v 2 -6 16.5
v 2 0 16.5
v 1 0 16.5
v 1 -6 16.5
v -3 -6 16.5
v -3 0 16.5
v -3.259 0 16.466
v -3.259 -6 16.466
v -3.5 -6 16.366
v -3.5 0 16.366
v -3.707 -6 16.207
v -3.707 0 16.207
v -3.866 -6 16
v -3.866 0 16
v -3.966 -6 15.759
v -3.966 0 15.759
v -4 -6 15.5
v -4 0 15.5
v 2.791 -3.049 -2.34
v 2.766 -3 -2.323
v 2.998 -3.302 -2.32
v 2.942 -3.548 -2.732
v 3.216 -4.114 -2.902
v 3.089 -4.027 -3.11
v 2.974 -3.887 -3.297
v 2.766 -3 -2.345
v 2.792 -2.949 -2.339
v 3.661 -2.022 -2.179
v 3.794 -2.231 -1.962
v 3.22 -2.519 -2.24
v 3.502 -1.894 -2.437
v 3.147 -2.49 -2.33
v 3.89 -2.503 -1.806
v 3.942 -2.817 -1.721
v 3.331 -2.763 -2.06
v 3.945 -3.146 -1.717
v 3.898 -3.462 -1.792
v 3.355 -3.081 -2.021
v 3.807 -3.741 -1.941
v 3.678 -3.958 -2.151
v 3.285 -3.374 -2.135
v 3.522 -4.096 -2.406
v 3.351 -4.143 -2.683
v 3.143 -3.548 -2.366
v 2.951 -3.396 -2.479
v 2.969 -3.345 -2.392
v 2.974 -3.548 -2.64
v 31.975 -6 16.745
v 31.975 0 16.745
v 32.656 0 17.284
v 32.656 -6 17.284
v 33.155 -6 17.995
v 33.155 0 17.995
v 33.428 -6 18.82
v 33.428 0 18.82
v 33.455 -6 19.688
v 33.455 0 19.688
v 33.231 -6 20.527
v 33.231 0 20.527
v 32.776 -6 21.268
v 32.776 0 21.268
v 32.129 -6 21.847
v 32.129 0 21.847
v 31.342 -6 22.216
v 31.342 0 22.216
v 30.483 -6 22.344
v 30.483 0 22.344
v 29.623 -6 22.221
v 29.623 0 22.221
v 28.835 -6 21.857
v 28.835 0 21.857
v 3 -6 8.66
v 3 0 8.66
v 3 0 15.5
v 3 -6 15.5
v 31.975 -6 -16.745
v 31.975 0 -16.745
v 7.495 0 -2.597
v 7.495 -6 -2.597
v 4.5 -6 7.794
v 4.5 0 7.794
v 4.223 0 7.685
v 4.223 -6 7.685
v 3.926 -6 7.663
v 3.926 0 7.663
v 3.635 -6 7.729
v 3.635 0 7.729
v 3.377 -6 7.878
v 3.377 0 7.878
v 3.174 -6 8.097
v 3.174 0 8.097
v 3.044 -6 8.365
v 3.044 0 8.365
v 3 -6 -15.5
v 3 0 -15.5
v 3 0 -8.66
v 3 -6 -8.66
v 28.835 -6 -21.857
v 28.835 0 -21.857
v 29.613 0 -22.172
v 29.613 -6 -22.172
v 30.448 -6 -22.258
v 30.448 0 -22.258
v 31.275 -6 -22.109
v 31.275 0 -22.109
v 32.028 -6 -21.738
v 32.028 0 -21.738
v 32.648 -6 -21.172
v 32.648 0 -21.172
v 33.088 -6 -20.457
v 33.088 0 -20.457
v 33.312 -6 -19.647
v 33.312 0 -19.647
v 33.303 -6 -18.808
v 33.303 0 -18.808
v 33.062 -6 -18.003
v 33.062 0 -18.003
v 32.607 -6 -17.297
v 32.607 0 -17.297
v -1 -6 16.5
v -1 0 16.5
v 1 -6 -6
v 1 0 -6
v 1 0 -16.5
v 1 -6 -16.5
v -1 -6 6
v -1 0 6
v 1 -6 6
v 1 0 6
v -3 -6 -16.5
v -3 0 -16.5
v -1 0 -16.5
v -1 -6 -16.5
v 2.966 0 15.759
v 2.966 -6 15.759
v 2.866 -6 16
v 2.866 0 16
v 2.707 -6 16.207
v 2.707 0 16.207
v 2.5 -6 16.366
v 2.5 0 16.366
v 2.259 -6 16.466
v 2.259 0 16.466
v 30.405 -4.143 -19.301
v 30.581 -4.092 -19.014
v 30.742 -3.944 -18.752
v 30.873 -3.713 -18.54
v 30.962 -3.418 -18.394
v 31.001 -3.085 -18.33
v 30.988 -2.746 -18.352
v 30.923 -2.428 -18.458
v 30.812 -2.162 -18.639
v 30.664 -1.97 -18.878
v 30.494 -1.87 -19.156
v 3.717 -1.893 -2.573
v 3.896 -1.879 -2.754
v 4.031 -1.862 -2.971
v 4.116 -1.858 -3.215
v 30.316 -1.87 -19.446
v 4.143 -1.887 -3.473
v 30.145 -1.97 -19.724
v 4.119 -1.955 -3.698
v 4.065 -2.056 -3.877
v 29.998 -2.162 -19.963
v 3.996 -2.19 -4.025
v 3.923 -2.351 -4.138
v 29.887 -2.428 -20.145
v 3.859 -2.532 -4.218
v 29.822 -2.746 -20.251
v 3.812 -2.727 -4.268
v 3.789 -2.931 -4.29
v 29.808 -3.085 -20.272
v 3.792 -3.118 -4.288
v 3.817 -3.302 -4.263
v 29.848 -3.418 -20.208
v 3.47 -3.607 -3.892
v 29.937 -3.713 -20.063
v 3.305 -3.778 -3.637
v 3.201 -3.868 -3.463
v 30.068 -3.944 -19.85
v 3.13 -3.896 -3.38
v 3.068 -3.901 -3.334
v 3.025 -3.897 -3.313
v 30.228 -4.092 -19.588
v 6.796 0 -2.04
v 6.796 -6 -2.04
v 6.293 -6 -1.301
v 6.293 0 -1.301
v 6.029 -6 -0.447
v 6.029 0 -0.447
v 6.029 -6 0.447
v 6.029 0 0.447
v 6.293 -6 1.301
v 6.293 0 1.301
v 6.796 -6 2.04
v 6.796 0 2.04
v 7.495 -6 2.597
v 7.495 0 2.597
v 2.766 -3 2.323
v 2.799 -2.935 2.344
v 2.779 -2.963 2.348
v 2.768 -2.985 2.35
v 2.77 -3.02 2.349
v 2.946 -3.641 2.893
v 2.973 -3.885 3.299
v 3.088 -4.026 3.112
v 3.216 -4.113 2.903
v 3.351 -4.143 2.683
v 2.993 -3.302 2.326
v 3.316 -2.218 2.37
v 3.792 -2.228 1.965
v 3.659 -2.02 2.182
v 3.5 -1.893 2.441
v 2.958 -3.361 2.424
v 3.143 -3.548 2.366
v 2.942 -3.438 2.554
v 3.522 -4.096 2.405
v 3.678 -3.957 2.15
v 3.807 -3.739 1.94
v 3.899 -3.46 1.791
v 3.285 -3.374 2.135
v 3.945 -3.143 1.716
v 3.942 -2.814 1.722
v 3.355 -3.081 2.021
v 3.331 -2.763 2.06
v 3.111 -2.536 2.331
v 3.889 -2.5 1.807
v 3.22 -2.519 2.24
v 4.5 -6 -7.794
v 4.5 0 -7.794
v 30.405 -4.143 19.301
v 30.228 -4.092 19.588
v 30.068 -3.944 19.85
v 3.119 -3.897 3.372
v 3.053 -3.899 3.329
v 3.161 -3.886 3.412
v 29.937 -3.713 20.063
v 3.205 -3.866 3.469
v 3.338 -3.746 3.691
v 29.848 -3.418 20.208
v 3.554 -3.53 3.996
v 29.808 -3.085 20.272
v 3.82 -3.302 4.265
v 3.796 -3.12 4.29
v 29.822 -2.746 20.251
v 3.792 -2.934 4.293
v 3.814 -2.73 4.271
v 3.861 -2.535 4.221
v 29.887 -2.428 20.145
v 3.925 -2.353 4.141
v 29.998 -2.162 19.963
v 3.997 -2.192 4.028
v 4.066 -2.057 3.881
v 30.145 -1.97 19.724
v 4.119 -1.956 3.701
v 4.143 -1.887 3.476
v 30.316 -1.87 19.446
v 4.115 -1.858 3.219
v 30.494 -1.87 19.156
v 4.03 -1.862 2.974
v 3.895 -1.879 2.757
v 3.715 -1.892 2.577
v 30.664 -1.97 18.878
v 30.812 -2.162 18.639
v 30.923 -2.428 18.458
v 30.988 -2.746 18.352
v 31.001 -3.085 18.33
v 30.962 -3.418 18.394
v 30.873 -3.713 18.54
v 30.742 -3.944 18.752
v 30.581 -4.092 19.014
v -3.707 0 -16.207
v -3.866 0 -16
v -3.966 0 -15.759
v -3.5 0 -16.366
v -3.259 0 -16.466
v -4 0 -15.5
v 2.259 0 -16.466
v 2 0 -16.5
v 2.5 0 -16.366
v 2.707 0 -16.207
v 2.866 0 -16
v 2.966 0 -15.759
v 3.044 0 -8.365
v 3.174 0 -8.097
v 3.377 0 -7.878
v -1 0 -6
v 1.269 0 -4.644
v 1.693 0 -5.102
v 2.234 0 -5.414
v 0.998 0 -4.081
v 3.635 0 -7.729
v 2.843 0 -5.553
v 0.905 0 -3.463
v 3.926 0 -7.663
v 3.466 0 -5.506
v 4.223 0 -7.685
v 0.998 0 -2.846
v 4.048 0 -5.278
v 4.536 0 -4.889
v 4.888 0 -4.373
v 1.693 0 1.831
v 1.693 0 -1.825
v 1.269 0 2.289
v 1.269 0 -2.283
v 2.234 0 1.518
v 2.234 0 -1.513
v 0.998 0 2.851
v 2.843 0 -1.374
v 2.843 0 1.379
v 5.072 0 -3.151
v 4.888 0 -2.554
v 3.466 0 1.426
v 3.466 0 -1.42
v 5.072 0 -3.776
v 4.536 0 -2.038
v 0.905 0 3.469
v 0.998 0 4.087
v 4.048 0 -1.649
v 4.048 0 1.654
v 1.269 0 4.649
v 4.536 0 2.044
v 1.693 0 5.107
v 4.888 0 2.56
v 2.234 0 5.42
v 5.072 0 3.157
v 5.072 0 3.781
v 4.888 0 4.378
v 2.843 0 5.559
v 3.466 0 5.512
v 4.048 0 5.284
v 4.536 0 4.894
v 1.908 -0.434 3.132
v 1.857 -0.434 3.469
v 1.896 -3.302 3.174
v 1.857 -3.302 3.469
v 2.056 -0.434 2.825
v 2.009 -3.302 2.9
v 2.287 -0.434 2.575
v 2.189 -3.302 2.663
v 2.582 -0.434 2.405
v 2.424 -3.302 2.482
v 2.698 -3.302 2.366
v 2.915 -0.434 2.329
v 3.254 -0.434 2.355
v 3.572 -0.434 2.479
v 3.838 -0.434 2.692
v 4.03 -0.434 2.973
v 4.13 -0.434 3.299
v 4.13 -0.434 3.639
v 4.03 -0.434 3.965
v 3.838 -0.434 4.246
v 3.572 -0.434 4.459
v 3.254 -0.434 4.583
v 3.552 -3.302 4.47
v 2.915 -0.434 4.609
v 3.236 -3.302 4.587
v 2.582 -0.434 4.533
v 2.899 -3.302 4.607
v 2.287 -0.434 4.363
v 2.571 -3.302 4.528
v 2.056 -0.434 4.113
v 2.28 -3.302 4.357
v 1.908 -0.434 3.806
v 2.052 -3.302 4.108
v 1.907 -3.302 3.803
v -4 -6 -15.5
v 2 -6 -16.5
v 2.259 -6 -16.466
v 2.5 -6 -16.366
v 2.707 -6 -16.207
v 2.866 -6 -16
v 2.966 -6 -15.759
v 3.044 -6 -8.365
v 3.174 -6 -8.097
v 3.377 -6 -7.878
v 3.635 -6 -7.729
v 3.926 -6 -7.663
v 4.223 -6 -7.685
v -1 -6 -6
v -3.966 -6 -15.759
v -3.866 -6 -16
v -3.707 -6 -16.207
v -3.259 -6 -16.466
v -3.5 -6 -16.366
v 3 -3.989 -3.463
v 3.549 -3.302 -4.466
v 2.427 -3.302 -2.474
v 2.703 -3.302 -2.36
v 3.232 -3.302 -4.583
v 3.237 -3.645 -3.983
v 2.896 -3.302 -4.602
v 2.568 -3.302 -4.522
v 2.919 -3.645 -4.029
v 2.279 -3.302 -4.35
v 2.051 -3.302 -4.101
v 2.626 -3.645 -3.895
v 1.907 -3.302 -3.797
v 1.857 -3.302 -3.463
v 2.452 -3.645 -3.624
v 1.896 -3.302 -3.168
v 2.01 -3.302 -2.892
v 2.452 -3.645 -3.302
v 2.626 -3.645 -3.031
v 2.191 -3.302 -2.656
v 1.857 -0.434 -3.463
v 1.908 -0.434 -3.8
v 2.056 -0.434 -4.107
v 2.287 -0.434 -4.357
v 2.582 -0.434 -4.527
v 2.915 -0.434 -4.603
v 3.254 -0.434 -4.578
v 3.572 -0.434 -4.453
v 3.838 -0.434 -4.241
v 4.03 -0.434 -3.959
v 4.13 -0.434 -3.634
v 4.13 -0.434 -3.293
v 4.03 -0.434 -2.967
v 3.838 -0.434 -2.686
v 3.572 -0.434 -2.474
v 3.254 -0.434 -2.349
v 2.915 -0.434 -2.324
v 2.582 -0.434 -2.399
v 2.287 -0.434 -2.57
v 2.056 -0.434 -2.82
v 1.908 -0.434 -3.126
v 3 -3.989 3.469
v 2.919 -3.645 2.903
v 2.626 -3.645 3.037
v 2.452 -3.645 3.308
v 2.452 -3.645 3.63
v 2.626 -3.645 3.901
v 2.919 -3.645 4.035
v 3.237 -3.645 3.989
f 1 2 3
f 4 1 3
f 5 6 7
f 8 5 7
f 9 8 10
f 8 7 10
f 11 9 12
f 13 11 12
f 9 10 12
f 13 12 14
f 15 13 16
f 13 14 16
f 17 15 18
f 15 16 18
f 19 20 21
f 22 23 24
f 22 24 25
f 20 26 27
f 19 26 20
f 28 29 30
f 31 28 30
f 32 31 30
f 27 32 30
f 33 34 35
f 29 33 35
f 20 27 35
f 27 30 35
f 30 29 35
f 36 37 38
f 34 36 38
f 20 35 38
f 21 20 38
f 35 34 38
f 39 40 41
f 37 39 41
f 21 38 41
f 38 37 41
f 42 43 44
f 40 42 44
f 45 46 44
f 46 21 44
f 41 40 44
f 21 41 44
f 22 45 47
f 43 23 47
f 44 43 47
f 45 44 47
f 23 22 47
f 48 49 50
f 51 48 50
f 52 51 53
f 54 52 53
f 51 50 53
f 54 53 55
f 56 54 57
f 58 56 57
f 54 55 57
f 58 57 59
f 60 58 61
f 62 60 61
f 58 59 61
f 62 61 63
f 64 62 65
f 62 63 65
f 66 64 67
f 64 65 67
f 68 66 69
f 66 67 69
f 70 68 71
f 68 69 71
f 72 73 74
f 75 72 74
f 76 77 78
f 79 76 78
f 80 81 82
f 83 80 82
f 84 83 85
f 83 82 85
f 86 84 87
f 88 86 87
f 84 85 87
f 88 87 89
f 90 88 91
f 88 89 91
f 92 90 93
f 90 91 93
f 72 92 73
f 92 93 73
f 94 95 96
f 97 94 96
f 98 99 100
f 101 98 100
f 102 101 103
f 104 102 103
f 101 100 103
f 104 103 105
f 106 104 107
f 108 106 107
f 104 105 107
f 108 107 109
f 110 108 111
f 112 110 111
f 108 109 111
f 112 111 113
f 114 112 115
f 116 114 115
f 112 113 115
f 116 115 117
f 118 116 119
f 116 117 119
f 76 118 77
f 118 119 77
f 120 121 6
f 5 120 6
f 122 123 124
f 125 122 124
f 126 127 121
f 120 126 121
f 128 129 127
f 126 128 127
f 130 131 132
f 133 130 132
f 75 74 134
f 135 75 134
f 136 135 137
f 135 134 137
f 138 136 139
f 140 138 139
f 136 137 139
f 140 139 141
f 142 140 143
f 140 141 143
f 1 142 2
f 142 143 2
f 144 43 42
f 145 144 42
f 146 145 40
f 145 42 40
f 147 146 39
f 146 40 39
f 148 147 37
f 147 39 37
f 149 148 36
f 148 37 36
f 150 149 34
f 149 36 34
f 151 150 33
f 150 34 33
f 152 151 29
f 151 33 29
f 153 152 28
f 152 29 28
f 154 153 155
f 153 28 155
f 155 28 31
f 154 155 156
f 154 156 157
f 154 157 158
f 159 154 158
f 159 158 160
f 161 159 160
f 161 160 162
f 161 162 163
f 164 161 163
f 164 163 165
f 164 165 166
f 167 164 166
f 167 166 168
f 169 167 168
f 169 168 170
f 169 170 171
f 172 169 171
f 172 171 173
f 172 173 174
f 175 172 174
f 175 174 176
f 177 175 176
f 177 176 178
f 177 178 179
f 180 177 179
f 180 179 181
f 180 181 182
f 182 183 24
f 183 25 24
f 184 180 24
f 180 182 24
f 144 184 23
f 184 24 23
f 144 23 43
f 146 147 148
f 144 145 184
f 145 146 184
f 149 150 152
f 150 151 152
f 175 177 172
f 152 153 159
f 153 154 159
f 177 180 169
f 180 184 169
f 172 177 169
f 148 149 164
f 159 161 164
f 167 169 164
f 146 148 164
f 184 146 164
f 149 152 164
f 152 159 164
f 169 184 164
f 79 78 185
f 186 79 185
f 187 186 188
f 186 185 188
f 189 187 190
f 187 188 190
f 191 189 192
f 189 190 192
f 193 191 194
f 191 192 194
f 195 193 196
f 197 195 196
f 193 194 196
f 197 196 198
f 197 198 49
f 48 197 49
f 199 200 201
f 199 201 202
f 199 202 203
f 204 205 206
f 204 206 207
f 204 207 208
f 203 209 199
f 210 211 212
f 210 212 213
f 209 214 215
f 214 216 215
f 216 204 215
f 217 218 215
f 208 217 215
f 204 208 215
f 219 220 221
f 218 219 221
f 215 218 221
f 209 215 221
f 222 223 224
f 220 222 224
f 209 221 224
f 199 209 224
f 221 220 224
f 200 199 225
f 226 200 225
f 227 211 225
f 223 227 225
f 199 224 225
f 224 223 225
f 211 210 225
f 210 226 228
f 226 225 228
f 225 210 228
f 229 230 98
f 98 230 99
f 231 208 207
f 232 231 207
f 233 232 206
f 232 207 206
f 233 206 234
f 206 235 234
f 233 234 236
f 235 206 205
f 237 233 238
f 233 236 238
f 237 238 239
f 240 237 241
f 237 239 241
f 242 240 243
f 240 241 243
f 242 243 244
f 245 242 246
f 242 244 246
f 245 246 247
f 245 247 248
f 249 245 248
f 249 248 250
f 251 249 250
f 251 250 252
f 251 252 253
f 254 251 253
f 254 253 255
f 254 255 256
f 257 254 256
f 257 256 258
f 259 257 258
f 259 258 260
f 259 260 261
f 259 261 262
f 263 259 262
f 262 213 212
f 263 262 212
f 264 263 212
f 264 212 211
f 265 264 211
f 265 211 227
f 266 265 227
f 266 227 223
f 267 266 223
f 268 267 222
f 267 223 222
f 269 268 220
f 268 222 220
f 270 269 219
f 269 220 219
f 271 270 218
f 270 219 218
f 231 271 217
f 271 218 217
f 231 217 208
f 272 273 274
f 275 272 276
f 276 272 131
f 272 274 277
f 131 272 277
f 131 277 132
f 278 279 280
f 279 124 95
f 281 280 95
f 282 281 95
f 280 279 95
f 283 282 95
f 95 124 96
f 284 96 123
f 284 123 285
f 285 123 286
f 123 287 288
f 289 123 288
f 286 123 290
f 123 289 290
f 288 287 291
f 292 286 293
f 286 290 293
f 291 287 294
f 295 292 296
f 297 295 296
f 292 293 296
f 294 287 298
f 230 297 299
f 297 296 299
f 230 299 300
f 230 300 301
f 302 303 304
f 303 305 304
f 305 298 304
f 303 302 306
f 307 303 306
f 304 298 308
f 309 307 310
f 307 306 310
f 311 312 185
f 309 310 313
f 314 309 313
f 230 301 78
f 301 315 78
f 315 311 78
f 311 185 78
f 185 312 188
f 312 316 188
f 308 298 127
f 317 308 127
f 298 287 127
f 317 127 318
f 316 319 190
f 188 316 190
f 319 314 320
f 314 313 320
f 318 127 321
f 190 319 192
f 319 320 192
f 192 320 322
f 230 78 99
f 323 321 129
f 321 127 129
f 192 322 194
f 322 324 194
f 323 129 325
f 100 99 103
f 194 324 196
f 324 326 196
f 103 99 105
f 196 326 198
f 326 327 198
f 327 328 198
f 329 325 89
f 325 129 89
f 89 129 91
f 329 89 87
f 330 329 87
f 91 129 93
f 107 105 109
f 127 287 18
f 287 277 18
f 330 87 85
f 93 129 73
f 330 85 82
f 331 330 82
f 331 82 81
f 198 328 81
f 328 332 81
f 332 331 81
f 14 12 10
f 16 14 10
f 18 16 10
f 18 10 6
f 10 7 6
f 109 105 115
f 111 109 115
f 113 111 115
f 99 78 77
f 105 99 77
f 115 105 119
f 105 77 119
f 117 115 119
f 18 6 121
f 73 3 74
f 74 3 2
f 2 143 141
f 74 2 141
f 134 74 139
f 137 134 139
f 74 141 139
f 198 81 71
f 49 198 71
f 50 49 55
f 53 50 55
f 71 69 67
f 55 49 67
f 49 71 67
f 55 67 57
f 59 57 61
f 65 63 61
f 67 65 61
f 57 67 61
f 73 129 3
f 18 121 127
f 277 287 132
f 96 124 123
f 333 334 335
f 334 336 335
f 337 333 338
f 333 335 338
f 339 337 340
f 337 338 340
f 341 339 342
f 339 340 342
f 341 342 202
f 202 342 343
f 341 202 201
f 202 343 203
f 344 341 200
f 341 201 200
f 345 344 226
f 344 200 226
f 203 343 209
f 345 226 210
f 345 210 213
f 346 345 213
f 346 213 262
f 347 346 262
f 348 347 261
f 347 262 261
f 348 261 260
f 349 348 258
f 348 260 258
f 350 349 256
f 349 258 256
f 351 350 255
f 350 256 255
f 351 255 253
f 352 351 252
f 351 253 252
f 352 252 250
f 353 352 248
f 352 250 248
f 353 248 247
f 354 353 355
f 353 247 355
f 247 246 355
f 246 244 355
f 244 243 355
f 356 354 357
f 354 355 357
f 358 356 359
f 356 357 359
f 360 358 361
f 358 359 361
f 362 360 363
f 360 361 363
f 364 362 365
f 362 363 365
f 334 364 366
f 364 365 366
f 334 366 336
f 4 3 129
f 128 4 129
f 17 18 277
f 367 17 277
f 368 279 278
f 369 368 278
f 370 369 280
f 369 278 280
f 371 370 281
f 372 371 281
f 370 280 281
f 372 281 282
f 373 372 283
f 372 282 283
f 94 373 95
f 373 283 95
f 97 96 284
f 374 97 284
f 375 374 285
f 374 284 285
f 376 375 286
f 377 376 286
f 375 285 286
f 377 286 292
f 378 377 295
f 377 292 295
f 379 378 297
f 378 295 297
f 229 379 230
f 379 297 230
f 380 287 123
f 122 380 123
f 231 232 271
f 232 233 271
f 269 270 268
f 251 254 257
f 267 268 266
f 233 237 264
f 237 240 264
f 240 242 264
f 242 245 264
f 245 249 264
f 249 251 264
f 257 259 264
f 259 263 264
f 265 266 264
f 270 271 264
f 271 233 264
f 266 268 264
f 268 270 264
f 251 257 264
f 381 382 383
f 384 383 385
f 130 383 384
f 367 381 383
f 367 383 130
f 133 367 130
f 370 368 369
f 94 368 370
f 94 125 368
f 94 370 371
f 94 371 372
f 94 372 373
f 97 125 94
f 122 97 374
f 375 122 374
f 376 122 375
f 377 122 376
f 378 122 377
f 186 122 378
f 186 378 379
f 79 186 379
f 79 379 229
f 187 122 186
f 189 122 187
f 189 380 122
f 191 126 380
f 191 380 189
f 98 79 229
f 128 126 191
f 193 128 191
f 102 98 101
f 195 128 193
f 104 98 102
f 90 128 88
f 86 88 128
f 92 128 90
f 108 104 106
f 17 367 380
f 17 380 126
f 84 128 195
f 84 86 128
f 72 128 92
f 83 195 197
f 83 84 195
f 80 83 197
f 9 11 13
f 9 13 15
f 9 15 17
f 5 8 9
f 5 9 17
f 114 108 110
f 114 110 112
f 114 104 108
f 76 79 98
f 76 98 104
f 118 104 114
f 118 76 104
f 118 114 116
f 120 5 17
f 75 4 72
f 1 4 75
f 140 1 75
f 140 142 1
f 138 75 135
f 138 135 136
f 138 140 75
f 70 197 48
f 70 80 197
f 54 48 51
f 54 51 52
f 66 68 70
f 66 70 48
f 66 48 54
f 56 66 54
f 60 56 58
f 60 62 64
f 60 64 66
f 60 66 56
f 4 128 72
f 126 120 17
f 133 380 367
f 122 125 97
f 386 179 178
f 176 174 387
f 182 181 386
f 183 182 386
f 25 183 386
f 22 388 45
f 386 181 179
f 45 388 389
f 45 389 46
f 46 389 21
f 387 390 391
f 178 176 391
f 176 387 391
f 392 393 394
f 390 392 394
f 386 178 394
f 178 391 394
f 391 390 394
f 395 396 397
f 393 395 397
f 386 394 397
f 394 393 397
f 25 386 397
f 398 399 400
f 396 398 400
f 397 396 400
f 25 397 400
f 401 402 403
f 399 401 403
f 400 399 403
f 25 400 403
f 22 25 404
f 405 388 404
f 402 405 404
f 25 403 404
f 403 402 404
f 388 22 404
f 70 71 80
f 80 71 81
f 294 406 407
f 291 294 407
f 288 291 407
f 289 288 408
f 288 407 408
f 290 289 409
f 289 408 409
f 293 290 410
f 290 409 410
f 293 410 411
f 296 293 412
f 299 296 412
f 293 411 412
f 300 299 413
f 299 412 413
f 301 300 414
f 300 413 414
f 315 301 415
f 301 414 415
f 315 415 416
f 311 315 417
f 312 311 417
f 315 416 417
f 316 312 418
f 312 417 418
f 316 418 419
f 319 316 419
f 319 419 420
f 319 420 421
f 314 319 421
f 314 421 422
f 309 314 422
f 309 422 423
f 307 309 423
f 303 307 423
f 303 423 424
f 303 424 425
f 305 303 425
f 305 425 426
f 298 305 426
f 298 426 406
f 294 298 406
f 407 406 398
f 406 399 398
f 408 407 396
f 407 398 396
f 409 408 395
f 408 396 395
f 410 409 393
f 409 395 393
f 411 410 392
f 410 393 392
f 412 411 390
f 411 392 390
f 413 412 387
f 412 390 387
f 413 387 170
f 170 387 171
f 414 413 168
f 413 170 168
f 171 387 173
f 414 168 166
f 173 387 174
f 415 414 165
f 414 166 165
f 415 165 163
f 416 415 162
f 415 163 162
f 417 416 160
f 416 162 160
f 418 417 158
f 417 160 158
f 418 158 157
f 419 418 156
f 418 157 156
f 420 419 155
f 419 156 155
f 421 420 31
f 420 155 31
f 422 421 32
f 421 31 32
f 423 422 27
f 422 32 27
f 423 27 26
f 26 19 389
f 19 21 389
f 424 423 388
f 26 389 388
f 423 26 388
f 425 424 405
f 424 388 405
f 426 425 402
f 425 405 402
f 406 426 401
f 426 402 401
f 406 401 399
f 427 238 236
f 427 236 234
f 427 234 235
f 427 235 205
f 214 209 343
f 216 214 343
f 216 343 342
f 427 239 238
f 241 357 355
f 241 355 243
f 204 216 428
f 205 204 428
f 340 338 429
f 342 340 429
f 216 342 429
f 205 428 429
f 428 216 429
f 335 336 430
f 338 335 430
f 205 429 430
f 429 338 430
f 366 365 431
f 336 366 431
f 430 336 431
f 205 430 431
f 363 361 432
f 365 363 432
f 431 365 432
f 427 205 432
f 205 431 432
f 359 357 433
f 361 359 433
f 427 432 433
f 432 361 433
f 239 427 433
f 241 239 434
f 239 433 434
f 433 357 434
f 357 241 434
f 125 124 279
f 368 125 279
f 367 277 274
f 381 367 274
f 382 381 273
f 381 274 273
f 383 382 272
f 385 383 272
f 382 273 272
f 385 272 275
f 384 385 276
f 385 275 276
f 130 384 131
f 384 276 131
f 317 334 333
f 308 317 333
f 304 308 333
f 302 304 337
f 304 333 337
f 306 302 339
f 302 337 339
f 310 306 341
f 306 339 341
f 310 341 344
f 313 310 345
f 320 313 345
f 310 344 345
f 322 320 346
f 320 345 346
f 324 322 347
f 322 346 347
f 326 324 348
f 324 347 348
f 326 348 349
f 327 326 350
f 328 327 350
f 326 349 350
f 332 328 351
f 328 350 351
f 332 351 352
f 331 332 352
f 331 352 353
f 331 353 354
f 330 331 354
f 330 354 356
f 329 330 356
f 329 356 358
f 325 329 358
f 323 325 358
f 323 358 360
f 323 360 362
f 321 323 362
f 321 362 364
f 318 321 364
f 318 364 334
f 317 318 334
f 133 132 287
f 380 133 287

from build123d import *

# Parameters (mm, degrees)
F1_DEPTH       = 6
F3_D           = 2.286
F3_DEPTH       = 3.302
F3_CSINK_D     = 4.191
F3_CSINK_ANGLE = 131
F3_TIP         = 0.6867836875
F4_D           = 2.286
F4_DEPTH       = 3.302
F4_CSINK_D     = 4.191
F4_CSINK_ANGLE = 131
F4_TIP         = 0.6867836875
F6_D           = 2.286
F6_DEPTH       = 31.75
F6_TIP         = 0.6867836875
F8_D           = 2.286
F8_DEPTH       = 31.75
F8_TIP         = 0.6867836875
F9_DEPTH       = 6


with BuildPart() as f1:
    # F0 (on Front) → F1 (new body)
    with BuildSketch(Plane.XZ):
        with BuildLine():
            Line((1, 16.5), (1, 6))
            Line((1, 6), (1, 0))
            Line((1, 0), (1, -6))
            Line((1, -6), (1, -16.5))
            Line((1, -16.5), (2, -16.5))
            ThreePointArc((2, -16.5), (2.7071067812, -16.2071067812), (3, -15.5))
            Line((3, -15.5), (3, -8.6602540378))
            ThreePointArc((3, -8.6602540378), (3.5001799931, -7.7941247399), (4.5003599214, -7.7944365345))
            Line((4.5003599214, -7.7944365345), (28.8345806574, -21.8572947335))
            Line((28.8345806574, -21.8572947335), (31.9750532508, -16.7448166758))
            Line((31.9750532508, -16.7448166758), (7.4946042855, -2.5974525099))
            ThreePointArc((7.4946042855, -2.5974525099), (5.9956840498, 0), (7.4946042855, 2.5974525099))
            Line((7.4946042855, 2.5974525099), (31.9750532508, 16.7448166758))
            Line((31.9750532508, 16.7448166758), (28.8345806574, 21.8572947335))
            Line((28.8345806574, 21.8572947335), (4.5003599214, 7.7944365345))
            ThreePointArc((4.5003599214, 7.7944365345), (3.5001799931, 7.7941247399), (3, 8.6602540378))
            Line((3, 8.6602540378), (3, 15.5))
            ThreePointArc((3, 15.5), (2.7071067812, 16.2071067812), (2, 16.5))
            Line((2, 16.5), (1, 16.5))
        make_face()
        with BuildLine():
            Line((-1, -6), (-1, 6))
            Line((-1, 6), (-1, 16.5))
            Line((-1, 16.5), (-3, 16.5))
            ThreePointArc((-3, 16.5), (-3.7071067812, 16.2071067812), (-4, 15.5))
            Line((-4, 15.5), (-4, -15.5))
            ThreePointArc((-4, -15.5), (-3.7071067812, -16.2071067812), (-3, -16.5))
            Line((-3, -16.5), (-1, -16.5))
            Line((-1, -16.5), (-1, -6))
        make_face()
        Polygon((1, 0), (1, 6), (-1, 6), (-1, -6), (1, -6), align=None)
    extrude(amount=F1_DEPTH)

    # F3
    with Locations(Plane(origin=(0, 0, 0), x_dir=(1, 0, 0), z_dir=(0, 1, 0))):
        with Locations((3, 3.4633801802)):
            CounterSinkHole(F3_D / 2, F3_CSINK_D / 2, depth=F3_DEPTH, counter_sink_angle=F3_CSINK_ANGLE)
            with Locations((0, 0, -(F3_DEPTH + F3_TIP / 2))):  # 118° drill point
                Cone(0, F3_D / 2, F3_TIP, mode=Mode.SUBTRACT)

    # F4
    with Locations(Plane(origin=(0, 0, 0), x_dir=(1, 0, 0), z_dir=(0, 1, 0))):
        with Locations((3, -3.4689440442)):
            CounterSinkHole(F4_D / 2, F4_CSINK_D / 2, depth=F4_DEPTH, counter_sink_angle=F4_CSINK_ANGLE)
            with Locations((0, 0, -(F4_DEPTH + F4_TIP / 2))):  # 118° drill point
                Cone(0, F4_D / 2, F4_TIP, mode=Mode.SUBTRACT)

    # F6
    with Locations(Plane(origin=(30.6831613521, 0, 18.8479297546), x_dir=(0, 1, 0), z_dir=(0.8520796763, 0, 0.5234120989))):
        with Locations((-3, 0.5317882384)):
            Hole(F6_D / 2, depth=F6_DEPTH)
            with Locations((0, 0, -(F6_DEPTH + F6_TIP / 2))):  # 118° drill point
                Cone(0, F6_D / 2, F6_TIP, mode=Mode.SUBTRACT)

    # F8
    with Locations(Plane(origin=(30.6831613521, 0, -18.8479297546), x_dir=(0, 1, 0), z_dir=(0.8520796763, 0, -0.5234120989))):
        with Locations((-3, -0.5317882384)):
            Hole(F8_D / 2, depth=F8_DEPTH)
            with Locations((0, 0, -(F8_DEPTH + F8_TIP / 2))):  # 118° drill point
                Cone(0, F8_D / 2, F8_TIP, mode=Mode.SUBTRACT)

    # F0 (on Front) → F9 (join)
    with BuildSketch(Plane.XZ):
        with BuildLine():
            ThreePointArc((31.9750532508, 16.7448166758), (33.0305925786, 20.9140066634), (28.8345806574, 21.8572947335))
            Line((28.8345806574, 21.8572947335), (31.9750532508, 16.7448166758))
        make_face()
        with BuildLine():
            Line((31.9750532508, -16.7448166758), (28.8345806574, -21.8572947335))
            ThreePointArc((28.8345806574, -21.8572947335), (32.8933608768, -20.829708522), (31.9750532508, -16.7448166758))
        make_face()
    extrude(amount=F9_DEPTH)


solid = f1.part
